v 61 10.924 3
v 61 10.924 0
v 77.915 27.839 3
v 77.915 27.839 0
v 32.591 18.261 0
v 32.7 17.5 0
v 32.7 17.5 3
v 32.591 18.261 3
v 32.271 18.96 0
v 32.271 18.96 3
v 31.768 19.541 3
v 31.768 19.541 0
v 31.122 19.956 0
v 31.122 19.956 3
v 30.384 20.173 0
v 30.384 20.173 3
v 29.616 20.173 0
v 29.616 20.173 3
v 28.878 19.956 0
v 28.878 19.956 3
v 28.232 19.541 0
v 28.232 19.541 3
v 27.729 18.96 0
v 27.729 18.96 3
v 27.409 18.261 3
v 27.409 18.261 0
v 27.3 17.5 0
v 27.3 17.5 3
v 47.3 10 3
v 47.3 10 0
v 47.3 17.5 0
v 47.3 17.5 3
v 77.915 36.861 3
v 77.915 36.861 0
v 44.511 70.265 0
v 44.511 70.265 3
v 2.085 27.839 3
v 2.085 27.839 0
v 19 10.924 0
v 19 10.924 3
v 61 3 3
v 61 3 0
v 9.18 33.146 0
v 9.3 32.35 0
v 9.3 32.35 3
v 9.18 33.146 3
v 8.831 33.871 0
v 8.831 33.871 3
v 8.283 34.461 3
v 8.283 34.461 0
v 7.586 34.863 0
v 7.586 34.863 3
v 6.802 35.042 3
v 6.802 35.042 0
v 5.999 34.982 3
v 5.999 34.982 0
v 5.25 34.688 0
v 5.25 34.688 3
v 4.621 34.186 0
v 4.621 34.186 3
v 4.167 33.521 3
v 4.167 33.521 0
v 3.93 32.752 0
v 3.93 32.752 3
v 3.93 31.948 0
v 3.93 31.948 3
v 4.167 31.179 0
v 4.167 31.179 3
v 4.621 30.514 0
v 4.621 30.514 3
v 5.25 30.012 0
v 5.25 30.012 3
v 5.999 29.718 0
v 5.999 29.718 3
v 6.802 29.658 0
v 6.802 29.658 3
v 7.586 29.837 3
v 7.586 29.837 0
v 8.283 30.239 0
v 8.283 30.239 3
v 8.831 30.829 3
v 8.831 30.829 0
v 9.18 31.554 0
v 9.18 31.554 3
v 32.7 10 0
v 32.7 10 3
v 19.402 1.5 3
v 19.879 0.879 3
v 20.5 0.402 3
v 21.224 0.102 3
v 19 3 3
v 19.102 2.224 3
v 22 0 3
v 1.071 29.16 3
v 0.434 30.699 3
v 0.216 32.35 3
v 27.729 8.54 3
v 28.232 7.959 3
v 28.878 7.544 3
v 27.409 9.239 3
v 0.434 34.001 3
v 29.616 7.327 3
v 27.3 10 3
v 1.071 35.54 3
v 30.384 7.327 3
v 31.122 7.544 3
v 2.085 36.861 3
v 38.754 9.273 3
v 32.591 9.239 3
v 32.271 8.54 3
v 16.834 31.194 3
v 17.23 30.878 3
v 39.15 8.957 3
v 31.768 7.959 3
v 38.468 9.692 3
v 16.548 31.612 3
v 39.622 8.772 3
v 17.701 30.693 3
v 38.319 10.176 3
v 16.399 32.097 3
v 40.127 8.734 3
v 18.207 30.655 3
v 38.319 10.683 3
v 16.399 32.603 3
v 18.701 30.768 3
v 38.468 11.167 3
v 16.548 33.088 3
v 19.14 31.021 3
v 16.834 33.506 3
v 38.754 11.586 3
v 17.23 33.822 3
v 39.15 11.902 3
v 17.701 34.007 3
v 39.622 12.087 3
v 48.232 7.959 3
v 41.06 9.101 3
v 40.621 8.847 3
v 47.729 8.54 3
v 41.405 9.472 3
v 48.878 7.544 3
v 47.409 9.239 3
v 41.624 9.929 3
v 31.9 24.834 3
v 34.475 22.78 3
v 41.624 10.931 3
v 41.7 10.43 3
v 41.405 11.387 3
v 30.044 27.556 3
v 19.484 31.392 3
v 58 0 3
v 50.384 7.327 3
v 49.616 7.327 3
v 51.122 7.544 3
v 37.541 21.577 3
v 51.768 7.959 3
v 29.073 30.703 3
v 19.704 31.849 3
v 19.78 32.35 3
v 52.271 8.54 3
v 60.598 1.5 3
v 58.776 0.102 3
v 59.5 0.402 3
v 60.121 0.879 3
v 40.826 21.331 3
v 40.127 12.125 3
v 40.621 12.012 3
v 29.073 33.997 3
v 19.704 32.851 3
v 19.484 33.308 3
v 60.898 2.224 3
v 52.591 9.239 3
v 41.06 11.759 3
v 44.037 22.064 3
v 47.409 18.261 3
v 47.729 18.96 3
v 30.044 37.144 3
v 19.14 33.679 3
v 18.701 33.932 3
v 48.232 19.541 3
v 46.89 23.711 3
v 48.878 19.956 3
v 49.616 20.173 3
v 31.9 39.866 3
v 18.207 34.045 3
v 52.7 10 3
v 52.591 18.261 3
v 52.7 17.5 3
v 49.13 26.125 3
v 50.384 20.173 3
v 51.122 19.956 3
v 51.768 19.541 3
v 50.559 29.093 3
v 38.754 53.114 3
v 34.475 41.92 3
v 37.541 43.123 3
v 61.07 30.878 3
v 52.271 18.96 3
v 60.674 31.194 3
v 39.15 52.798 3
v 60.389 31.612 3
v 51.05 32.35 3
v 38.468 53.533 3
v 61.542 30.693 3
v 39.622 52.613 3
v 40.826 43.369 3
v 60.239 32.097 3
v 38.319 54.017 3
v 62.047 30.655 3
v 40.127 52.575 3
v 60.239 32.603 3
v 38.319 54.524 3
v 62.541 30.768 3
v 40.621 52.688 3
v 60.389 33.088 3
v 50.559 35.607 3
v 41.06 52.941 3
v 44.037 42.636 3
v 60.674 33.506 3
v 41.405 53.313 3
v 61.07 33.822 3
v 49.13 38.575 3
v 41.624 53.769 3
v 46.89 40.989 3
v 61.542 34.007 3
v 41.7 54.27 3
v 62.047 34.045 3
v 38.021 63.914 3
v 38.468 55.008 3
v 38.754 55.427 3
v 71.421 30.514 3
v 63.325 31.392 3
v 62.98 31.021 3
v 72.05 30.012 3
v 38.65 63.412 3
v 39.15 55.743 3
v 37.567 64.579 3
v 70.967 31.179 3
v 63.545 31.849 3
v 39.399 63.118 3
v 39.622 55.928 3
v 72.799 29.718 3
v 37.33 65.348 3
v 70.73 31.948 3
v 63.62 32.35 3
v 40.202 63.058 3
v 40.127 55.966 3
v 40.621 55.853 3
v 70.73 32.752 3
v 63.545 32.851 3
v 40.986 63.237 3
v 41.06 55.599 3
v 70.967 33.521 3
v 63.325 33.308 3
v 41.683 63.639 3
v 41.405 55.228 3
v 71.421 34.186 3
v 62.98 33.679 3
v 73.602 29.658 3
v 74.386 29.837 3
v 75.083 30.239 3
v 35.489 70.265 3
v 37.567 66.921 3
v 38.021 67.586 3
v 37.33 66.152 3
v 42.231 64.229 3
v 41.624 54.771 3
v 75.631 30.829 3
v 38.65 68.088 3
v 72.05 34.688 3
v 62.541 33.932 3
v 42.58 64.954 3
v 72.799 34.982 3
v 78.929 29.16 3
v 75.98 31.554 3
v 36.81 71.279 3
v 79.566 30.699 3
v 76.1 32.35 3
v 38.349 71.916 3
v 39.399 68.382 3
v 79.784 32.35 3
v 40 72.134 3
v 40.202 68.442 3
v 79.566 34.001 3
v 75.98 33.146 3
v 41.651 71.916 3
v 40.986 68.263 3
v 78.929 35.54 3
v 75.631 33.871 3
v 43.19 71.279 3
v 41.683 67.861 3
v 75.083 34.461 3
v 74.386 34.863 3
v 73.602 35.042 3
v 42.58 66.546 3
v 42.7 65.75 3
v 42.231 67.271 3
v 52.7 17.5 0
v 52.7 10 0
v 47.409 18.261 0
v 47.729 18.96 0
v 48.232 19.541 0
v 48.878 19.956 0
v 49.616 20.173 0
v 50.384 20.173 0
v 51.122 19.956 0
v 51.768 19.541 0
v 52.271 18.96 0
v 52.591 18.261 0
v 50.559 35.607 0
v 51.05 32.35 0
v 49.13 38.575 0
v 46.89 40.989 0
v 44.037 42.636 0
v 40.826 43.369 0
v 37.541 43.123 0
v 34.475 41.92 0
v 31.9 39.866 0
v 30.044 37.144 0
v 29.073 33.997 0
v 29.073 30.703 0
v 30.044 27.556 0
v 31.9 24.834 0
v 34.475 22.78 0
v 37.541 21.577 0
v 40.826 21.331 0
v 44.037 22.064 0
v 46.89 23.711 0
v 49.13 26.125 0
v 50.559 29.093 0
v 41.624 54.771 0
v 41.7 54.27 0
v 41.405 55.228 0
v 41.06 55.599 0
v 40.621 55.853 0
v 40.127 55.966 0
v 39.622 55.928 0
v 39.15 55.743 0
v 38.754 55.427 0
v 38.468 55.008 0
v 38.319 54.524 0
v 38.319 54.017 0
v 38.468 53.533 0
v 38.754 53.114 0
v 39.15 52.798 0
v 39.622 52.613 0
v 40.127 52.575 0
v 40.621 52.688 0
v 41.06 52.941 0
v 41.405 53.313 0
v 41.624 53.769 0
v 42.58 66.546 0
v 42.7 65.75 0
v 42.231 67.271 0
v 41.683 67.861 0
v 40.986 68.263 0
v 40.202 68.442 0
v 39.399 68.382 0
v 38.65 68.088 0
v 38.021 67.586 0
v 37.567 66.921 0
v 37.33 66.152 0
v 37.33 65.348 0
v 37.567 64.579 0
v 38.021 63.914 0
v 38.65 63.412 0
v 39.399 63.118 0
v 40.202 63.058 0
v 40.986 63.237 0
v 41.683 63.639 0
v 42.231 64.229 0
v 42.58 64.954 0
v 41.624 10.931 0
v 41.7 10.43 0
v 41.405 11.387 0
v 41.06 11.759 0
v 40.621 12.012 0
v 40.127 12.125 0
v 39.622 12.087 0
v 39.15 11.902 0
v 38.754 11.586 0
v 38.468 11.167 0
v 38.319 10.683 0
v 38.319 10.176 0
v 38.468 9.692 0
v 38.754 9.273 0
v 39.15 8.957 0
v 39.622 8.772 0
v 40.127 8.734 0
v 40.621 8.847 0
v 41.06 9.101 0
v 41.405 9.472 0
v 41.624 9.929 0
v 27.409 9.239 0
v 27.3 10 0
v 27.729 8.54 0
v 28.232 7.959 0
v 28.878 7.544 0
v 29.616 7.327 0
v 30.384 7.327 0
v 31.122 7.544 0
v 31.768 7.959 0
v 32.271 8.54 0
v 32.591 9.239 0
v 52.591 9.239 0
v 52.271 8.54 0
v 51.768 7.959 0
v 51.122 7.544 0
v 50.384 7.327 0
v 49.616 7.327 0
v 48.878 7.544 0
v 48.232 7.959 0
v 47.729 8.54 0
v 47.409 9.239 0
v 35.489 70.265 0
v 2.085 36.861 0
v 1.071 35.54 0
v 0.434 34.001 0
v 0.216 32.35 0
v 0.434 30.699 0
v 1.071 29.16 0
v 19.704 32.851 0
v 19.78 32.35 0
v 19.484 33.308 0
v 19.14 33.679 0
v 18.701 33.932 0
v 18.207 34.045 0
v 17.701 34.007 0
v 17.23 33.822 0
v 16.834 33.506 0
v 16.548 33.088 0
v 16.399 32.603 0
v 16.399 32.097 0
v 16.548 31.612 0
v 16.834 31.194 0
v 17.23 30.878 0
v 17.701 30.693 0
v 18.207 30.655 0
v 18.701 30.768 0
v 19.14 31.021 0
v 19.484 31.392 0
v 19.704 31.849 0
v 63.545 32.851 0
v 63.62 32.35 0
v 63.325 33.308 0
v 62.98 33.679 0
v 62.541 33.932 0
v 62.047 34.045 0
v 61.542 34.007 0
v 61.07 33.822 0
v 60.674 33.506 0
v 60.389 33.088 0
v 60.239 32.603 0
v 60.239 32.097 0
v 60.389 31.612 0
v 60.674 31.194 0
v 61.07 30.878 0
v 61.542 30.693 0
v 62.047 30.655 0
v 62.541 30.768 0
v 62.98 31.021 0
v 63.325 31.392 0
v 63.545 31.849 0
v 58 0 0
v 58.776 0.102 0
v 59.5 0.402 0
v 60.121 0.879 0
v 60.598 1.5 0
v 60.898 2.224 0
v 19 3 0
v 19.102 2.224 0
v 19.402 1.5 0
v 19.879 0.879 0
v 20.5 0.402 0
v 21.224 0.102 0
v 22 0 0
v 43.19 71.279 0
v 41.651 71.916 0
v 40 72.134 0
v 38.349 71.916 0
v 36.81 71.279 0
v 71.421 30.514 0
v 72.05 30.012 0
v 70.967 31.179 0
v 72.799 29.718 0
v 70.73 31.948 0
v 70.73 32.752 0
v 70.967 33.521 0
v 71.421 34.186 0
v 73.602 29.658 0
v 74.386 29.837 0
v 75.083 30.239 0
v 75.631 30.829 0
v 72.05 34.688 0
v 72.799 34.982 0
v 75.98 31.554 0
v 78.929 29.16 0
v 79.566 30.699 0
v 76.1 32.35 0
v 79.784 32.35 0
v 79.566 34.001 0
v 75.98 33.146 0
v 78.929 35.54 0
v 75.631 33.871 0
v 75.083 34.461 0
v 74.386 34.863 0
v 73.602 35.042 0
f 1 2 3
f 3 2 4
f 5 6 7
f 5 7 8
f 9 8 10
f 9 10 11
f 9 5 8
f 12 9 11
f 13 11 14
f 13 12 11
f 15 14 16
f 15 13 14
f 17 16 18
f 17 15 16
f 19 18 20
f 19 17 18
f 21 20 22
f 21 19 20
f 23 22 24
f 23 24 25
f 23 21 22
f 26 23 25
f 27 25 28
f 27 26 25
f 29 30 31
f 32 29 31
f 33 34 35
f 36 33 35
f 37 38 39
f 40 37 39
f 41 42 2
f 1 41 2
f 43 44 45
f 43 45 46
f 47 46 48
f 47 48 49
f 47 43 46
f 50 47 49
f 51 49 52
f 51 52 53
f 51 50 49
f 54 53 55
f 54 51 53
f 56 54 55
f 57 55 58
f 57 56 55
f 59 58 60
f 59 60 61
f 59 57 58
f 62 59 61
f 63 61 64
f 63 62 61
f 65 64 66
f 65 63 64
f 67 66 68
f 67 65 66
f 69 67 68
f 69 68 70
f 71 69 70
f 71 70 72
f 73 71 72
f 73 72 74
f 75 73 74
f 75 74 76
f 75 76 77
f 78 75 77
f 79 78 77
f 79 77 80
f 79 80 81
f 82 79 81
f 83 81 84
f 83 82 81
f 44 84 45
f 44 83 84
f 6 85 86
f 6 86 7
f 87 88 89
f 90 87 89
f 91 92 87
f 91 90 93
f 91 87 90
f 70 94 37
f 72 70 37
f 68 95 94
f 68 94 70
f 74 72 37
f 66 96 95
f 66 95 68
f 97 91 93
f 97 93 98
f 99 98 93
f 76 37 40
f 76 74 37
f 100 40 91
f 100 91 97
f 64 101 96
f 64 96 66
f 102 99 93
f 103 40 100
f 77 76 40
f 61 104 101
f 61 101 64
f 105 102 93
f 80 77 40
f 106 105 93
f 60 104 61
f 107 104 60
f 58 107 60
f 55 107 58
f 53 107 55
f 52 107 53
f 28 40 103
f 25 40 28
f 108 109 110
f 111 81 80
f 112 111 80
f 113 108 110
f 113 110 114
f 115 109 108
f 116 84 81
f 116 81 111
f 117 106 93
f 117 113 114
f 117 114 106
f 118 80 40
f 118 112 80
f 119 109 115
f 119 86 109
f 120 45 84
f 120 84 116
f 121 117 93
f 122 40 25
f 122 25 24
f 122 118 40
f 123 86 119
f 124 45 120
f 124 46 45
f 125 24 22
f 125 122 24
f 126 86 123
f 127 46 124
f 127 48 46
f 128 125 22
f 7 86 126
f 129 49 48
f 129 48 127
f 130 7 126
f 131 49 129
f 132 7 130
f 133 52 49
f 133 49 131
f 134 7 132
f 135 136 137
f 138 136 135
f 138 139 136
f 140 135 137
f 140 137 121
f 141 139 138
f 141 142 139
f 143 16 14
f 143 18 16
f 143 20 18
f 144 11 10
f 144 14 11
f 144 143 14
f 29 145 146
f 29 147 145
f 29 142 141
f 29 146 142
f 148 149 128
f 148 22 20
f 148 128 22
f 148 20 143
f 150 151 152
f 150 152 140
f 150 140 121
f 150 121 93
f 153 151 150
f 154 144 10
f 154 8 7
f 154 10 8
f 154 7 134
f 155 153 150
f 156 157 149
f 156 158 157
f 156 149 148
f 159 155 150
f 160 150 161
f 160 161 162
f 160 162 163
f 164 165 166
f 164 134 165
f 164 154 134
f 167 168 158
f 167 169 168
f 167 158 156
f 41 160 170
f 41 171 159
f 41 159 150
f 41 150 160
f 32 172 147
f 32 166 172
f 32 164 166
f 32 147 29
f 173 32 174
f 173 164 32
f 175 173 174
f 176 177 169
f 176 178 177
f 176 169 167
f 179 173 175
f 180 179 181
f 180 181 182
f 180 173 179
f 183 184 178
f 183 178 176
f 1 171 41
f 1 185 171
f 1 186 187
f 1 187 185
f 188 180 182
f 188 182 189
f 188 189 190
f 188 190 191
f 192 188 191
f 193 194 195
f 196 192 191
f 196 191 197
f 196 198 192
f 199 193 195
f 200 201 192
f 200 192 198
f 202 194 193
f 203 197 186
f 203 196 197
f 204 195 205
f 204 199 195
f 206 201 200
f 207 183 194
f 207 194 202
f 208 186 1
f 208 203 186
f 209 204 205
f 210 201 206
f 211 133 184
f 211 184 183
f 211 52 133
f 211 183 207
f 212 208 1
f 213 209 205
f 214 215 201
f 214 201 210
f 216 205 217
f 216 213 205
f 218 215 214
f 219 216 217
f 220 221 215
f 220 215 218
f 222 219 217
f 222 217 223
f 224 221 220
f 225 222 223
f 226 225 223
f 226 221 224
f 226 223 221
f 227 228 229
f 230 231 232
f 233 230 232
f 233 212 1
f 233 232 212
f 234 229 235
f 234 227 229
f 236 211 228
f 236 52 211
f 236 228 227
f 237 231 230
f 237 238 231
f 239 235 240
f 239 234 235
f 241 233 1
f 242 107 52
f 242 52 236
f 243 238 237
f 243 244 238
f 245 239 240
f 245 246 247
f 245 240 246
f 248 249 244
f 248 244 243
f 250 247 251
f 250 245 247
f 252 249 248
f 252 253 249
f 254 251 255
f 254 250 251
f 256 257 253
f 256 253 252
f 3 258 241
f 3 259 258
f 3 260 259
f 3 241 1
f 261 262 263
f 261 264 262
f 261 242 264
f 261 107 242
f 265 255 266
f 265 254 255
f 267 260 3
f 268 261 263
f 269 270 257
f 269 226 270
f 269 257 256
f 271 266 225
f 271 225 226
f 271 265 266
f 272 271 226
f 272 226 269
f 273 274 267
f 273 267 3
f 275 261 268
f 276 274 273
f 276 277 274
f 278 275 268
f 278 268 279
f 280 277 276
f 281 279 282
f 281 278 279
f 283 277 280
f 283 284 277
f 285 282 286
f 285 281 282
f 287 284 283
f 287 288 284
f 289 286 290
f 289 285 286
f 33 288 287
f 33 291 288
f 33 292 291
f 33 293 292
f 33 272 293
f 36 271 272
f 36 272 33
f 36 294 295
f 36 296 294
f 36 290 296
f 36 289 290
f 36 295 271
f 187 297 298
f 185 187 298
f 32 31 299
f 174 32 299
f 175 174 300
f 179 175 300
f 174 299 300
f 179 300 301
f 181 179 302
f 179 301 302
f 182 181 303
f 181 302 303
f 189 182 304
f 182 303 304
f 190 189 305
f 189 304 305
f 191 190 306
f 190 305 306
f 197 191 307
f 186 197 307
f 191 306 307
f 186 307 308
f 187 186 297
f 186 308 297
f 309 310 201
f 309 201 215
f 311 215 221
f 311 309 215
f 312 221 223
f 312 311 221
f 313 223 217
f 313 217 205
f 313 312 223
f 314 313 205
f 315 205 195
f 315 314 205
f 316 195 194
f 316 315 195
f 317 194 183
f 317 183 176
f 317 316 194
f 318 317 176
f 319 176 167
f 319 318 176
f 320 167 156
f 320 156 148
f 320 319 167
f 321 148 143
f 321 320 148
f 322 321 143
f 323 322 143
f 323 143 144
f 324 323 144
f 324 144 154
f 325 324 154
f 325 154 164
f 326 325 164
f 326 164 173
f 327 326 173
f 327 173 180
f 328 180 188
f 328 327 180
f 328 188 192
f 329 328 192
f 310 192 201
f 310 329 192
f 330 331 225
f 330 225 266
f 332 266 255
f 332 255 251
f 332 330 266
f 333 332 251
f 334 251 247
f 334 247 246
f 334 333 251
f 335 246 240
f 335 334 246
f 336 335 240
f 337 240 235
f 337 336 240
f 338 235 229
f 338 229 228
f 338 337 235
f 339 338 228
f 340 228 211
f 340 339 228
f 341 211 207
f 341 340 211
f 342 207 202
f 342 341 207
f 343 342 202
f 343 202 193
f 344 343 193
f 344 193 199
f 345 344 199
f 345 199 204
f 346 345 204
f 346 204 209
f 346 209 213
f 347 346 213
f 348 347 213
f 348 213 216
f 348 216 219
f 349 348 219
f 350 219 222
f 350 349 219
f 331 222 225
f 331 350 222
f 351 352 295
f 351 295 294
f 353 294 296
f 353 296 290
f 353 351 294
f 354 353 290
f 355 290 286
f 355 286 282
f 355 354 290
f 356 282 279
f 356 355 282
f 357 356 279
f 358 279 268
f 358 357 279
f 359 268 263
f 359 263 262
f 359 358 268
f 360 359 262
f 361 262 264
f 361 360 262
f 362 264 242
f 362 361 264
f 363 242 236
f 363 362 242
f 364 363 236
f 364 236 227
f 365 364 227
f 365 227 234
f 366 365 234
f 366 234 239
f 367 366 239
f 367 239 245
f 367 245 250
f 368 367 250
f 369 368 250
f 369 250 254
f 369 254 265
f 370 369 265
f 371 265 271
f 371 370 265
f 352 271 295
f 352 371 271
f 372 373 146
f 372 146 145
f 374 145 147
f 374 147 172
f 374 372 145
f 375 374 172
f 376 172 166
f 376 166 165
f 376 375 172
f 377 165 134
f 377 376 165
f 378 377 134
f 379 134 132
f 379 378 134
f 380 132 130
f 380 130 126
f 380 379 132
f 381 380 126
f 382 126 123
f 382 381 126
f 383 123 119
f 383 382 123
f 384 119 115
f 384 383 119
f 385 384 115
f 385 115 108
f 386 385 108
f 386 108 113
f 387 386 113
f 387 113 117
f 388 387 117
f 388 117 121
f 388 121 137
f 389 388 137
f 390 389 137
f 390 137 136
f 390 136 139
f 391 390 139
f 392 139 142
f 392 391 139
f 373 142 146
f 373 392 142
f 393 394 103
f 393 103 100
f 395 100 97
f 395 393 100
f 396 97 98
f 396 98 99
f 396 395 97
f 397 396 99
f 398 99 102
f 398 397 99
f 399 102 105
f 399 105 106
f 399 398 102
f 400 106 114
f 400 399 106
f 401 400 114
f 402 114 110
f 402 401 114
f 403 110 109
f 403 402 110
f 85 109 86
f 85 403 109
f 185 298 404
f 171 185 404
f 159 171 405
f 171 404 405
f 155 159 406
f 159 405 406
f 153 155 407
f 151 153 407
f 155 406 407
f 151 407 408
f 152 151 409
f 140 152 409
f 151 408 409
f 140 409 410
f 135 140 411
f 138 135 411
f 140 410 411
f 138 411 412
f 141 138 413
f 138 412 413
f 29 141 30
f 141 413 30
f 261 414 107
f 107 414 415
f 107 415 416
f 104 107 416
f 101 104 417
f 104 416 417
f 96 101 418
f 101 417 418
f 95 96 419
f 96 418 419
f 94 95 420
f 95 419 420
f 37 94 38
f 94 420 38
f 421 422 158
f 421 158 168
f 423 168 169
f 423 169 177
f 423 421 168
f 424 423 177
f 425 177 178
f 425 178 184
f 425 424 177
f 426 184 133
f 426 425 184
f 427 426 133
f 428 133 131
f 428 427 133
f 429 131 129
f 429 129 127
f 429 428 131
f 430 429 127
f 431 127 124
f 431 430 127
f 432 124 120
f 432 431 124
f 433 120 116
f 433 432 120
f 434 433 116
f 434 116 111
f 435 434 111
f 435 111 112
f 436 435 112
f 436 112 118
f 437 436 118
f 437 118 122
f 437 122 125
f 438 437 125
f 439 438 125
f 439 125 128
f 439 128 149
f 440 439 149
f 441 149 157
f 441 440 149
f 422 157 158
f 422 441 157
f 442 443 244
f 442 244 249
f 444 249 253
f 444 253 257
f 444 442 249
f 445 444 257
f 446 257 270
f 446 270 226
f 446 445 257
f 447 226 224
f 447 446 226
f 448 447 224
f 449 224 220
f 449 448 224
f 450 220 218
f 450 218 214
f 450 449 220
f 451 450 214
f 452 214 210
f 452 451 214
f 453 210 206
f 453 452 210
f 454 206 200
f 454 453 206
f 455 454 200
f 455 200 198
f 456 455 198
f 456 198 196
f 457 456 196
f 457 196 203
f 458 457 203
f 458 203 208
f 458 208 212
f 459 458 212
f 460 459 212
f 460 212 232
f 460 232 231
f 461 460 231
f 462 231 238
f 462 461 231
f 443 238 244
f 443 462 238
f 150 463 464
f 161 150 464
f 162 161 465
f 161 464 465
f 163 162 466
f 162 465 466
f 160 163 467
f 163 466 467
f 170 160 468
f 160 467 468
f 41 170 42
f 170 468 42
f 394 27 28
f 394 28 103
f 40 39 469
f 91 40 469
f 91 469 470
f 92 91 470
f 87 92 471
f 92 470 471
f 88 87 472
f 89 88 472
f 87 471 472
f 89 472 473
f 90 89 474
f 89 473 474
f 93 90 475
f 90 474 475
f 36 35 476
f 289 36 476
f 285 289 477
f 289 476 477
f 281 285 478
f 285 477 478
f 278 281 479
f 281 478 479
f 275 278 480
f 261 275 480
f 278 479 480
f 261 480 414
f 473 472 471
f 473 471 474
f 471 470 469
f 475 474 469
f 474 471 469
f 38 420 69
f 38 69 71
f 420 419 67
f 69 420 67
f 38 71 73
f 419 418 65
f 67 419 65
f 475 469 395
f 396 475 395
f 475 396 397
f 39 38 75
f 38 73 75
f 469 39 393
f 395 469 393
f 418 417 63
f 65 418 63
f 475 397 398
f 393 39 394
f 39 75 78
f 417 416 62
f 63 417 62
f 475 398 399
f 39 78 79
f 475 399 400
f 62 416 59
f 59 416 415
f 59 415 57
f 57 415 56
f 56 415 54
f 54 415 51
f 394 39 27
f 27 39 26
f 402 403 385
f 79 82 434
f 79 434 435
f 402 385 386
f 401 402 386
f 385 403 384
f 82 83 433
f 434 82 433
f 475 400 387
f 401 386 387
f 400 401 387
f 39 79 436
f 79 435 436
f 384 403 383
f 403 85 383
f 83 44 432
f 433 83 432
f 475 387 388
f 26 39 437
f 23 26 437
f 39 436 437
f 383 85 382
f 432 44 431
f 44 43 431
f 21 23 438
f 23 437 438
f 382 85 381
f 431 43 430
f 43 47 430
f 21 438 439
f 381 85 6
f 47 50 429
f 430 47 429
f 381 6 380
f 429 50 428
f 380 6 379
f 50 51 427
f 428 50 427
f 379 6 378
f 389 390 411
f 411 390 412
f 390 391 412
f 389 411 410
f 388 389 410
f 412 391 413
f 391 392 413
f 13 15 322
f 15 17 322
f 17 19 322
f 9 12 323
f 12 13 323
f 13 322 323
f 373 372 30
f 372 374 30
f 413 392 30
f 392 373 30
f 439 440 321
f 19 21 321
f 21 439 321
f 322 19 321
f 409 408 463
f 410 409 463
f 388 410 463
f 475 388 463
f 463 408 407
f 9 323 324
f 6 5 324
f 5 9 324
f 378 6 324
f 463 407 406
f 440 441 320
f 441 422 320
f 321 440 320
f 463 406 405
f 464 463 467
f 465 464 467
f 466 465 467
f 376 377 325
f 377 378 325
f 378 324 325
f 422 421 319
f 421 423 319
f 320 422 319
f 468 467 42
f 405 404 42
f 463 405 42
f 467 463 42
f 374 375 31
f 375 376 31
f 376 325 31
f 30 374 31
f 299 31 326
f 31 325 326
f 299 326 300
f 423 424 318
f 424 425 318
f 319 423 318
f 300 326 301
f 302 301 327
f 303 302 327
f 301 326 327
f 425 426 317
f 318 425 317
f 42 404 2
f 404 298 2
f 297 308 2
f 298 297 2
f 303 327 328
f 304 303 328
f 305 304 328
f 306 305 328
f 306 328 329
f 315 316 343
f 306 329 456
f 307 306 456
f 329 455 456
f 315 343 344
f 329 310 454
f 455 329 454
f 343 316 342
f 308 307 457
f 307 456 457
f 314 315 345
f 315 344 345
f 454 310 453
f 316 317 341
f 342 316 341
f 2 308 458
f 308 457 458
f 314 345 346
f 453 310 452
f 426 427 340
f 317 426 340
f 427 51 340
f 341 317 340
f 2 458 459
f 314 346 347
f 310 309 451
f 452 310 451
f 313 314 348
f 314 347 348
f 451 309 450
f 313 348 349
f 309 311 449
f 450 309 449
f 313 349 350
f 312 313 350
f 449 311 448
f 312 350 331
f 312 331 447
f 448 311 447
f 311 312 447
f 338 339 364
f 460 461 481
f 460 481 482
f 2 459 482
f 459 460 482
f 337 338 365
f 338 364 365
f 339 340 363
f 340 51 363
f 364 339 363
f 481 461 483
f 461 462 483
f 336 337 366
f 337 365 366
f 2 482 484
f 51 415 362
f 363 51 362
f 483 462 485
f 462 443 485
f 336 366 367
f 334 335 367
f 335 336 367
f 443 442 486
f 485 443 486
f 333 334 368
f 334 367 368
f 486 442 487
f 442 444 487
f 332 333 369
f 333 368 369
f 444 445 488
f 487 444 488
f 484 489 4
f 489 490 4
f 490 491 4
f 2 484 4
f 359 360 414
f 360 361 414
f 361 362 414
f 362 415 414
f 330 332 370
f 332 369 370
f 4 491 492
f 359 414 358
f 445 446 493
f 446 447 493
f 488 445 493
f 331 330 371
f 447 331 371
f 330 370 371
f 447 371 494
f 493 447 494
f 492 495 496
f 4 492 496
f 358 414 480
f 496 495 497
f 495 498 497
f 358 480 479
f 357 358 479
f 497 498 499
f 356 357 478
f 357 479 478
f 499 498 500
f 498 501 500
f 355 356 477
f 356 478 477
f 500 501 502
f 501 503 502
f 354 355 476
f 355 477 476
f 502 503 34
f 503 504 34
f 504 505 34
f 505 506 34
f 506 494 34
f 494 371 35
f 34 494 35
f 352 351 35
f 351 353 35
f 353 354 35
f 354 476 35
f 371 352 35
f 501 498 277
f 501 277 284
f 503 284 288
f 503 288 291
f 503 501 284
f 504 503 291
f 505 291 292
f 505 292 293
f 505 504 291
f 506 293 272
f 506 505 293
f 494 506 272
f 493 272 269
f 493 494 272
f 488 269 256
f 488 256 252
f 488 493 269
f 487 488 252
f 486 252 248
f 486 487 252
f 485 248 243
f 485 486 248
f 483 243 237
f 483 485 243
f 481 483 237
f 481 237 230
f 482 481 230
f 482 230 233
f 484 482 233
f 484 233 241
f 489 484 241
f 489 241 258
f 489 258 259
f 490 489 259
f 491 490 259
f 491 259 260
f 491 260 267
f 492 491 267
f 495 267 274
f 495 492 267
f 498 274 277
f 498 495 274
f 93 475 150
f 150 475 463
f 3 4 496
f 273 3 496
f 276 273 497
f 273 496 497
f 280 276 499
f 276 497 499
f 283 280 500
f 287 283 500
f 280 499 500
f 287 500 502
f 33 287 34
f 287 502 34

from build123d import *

# Parameters (mm, degrees)
MODEL_R                         = 1.7
MODEL_R_2                       = 11.05
MODEL_R_3                       = 2.7
AUFSATZ_LINEAR_AUSTRAGEN1_DEPTH = 3


with BuildPart() as part:
    # Model → Aufsatz-Linear austragen1 (new body)
    with BuildSketch(Plane.XY):
        with BuildLine():
            Line((19, 10.923593129), (19, 3))
            ThreePointArc((19, 3), (19.878679656, 0.878679656), (22, 0))
            Line((22, 0), (58, 0))
            ThreePointArc((58, 0), (60.121320344, 0.878679656), (61, 3))
            Line((61, 3), (61, 10.923593129))
            Line((61, 10.923593129), (77.915065607, 27.838658665))
            ThreePointArc((77.915065607, 27.838658665), (79.783724343, 32.349999929), (77.915065607, 36.861341193))
            Line((77.915065607, 36.861341193), (44.511341215, 70.265065599))
            ThreePointArc((44.511341215, 70.265065599), (39.999999949, 72.133724339), (35.488658682, 70.265065603))
            Line((35.488658682, 70.265065603), (2.084934387, 36.861341261))
            ThreePointArc((2.084934387, 36.861341261), (0.216275654, 32.349999998), (2.08493439, 27.838658736))
            Line((2.08493439, 27.838658736), (19, 10.923593129))
        make_face()
        with Locations((40, 10.429689783)):
            Circle(MODEL_R, mode=Mode.SUBTRACT)
        with Locations((61.920310217, 32.35)):
            Circle(MODEL_R, mode=Mode.SUBTRACT)
        with Locations((40, 54.270310217)):
            Circle(MODEL_R, mode=Mode.SUBTRACT)
        with Locations((18.079689783, 32.35)):
            Circle(MODEL_R, mode=Mode.SUBTRACT)
        with Locations((40, 32.35)):
            Circle(MODEL_R_2, mode=Mode.SUBTRACT)
        with Locations((73.4, 32.35)):
            Circle(MODEL_R_3, mode=Mode.SUBTRACT)
        with Locations((40, 65.75)):
            Circle(MODEL_R_3, mode=Mode.SUBTRACT)
        with Locations((6.6, 32.35)):
            Circle(MODEL_R_3, mode=Mode.SUBTRACT)
        with BuildLine():
            Line((32.7, 10), (32.7, 17.5))
            ThreePointArc((32.7, 17.5), (30, 20.2), (27.3, 17.5))
            Line((27.3, 17.5), (27.3, 10))
            ThreePointArc((27.3, 10), (30, 7.3), (32.7, 10))
        make_face(mode=Mode.SUBTRACT)
        with BuildLine():
            Line((47.3, 10), (47.3, 17.5))
            ThreePointArc((47.3, 17.5), (50, 20.2), (52.7, 17.5))
            Line((52.7, 17.5), (52.7, 10))
            ThreePointArc((52.7, 10), (50, 7.3), (47.3, 10))
        make_face(mode=Mode.SUBTRACT)
    extrude(amount=AUFSATZ_LINEAR_AUSTRAGEN1_DEPTH)


solid = part.part
